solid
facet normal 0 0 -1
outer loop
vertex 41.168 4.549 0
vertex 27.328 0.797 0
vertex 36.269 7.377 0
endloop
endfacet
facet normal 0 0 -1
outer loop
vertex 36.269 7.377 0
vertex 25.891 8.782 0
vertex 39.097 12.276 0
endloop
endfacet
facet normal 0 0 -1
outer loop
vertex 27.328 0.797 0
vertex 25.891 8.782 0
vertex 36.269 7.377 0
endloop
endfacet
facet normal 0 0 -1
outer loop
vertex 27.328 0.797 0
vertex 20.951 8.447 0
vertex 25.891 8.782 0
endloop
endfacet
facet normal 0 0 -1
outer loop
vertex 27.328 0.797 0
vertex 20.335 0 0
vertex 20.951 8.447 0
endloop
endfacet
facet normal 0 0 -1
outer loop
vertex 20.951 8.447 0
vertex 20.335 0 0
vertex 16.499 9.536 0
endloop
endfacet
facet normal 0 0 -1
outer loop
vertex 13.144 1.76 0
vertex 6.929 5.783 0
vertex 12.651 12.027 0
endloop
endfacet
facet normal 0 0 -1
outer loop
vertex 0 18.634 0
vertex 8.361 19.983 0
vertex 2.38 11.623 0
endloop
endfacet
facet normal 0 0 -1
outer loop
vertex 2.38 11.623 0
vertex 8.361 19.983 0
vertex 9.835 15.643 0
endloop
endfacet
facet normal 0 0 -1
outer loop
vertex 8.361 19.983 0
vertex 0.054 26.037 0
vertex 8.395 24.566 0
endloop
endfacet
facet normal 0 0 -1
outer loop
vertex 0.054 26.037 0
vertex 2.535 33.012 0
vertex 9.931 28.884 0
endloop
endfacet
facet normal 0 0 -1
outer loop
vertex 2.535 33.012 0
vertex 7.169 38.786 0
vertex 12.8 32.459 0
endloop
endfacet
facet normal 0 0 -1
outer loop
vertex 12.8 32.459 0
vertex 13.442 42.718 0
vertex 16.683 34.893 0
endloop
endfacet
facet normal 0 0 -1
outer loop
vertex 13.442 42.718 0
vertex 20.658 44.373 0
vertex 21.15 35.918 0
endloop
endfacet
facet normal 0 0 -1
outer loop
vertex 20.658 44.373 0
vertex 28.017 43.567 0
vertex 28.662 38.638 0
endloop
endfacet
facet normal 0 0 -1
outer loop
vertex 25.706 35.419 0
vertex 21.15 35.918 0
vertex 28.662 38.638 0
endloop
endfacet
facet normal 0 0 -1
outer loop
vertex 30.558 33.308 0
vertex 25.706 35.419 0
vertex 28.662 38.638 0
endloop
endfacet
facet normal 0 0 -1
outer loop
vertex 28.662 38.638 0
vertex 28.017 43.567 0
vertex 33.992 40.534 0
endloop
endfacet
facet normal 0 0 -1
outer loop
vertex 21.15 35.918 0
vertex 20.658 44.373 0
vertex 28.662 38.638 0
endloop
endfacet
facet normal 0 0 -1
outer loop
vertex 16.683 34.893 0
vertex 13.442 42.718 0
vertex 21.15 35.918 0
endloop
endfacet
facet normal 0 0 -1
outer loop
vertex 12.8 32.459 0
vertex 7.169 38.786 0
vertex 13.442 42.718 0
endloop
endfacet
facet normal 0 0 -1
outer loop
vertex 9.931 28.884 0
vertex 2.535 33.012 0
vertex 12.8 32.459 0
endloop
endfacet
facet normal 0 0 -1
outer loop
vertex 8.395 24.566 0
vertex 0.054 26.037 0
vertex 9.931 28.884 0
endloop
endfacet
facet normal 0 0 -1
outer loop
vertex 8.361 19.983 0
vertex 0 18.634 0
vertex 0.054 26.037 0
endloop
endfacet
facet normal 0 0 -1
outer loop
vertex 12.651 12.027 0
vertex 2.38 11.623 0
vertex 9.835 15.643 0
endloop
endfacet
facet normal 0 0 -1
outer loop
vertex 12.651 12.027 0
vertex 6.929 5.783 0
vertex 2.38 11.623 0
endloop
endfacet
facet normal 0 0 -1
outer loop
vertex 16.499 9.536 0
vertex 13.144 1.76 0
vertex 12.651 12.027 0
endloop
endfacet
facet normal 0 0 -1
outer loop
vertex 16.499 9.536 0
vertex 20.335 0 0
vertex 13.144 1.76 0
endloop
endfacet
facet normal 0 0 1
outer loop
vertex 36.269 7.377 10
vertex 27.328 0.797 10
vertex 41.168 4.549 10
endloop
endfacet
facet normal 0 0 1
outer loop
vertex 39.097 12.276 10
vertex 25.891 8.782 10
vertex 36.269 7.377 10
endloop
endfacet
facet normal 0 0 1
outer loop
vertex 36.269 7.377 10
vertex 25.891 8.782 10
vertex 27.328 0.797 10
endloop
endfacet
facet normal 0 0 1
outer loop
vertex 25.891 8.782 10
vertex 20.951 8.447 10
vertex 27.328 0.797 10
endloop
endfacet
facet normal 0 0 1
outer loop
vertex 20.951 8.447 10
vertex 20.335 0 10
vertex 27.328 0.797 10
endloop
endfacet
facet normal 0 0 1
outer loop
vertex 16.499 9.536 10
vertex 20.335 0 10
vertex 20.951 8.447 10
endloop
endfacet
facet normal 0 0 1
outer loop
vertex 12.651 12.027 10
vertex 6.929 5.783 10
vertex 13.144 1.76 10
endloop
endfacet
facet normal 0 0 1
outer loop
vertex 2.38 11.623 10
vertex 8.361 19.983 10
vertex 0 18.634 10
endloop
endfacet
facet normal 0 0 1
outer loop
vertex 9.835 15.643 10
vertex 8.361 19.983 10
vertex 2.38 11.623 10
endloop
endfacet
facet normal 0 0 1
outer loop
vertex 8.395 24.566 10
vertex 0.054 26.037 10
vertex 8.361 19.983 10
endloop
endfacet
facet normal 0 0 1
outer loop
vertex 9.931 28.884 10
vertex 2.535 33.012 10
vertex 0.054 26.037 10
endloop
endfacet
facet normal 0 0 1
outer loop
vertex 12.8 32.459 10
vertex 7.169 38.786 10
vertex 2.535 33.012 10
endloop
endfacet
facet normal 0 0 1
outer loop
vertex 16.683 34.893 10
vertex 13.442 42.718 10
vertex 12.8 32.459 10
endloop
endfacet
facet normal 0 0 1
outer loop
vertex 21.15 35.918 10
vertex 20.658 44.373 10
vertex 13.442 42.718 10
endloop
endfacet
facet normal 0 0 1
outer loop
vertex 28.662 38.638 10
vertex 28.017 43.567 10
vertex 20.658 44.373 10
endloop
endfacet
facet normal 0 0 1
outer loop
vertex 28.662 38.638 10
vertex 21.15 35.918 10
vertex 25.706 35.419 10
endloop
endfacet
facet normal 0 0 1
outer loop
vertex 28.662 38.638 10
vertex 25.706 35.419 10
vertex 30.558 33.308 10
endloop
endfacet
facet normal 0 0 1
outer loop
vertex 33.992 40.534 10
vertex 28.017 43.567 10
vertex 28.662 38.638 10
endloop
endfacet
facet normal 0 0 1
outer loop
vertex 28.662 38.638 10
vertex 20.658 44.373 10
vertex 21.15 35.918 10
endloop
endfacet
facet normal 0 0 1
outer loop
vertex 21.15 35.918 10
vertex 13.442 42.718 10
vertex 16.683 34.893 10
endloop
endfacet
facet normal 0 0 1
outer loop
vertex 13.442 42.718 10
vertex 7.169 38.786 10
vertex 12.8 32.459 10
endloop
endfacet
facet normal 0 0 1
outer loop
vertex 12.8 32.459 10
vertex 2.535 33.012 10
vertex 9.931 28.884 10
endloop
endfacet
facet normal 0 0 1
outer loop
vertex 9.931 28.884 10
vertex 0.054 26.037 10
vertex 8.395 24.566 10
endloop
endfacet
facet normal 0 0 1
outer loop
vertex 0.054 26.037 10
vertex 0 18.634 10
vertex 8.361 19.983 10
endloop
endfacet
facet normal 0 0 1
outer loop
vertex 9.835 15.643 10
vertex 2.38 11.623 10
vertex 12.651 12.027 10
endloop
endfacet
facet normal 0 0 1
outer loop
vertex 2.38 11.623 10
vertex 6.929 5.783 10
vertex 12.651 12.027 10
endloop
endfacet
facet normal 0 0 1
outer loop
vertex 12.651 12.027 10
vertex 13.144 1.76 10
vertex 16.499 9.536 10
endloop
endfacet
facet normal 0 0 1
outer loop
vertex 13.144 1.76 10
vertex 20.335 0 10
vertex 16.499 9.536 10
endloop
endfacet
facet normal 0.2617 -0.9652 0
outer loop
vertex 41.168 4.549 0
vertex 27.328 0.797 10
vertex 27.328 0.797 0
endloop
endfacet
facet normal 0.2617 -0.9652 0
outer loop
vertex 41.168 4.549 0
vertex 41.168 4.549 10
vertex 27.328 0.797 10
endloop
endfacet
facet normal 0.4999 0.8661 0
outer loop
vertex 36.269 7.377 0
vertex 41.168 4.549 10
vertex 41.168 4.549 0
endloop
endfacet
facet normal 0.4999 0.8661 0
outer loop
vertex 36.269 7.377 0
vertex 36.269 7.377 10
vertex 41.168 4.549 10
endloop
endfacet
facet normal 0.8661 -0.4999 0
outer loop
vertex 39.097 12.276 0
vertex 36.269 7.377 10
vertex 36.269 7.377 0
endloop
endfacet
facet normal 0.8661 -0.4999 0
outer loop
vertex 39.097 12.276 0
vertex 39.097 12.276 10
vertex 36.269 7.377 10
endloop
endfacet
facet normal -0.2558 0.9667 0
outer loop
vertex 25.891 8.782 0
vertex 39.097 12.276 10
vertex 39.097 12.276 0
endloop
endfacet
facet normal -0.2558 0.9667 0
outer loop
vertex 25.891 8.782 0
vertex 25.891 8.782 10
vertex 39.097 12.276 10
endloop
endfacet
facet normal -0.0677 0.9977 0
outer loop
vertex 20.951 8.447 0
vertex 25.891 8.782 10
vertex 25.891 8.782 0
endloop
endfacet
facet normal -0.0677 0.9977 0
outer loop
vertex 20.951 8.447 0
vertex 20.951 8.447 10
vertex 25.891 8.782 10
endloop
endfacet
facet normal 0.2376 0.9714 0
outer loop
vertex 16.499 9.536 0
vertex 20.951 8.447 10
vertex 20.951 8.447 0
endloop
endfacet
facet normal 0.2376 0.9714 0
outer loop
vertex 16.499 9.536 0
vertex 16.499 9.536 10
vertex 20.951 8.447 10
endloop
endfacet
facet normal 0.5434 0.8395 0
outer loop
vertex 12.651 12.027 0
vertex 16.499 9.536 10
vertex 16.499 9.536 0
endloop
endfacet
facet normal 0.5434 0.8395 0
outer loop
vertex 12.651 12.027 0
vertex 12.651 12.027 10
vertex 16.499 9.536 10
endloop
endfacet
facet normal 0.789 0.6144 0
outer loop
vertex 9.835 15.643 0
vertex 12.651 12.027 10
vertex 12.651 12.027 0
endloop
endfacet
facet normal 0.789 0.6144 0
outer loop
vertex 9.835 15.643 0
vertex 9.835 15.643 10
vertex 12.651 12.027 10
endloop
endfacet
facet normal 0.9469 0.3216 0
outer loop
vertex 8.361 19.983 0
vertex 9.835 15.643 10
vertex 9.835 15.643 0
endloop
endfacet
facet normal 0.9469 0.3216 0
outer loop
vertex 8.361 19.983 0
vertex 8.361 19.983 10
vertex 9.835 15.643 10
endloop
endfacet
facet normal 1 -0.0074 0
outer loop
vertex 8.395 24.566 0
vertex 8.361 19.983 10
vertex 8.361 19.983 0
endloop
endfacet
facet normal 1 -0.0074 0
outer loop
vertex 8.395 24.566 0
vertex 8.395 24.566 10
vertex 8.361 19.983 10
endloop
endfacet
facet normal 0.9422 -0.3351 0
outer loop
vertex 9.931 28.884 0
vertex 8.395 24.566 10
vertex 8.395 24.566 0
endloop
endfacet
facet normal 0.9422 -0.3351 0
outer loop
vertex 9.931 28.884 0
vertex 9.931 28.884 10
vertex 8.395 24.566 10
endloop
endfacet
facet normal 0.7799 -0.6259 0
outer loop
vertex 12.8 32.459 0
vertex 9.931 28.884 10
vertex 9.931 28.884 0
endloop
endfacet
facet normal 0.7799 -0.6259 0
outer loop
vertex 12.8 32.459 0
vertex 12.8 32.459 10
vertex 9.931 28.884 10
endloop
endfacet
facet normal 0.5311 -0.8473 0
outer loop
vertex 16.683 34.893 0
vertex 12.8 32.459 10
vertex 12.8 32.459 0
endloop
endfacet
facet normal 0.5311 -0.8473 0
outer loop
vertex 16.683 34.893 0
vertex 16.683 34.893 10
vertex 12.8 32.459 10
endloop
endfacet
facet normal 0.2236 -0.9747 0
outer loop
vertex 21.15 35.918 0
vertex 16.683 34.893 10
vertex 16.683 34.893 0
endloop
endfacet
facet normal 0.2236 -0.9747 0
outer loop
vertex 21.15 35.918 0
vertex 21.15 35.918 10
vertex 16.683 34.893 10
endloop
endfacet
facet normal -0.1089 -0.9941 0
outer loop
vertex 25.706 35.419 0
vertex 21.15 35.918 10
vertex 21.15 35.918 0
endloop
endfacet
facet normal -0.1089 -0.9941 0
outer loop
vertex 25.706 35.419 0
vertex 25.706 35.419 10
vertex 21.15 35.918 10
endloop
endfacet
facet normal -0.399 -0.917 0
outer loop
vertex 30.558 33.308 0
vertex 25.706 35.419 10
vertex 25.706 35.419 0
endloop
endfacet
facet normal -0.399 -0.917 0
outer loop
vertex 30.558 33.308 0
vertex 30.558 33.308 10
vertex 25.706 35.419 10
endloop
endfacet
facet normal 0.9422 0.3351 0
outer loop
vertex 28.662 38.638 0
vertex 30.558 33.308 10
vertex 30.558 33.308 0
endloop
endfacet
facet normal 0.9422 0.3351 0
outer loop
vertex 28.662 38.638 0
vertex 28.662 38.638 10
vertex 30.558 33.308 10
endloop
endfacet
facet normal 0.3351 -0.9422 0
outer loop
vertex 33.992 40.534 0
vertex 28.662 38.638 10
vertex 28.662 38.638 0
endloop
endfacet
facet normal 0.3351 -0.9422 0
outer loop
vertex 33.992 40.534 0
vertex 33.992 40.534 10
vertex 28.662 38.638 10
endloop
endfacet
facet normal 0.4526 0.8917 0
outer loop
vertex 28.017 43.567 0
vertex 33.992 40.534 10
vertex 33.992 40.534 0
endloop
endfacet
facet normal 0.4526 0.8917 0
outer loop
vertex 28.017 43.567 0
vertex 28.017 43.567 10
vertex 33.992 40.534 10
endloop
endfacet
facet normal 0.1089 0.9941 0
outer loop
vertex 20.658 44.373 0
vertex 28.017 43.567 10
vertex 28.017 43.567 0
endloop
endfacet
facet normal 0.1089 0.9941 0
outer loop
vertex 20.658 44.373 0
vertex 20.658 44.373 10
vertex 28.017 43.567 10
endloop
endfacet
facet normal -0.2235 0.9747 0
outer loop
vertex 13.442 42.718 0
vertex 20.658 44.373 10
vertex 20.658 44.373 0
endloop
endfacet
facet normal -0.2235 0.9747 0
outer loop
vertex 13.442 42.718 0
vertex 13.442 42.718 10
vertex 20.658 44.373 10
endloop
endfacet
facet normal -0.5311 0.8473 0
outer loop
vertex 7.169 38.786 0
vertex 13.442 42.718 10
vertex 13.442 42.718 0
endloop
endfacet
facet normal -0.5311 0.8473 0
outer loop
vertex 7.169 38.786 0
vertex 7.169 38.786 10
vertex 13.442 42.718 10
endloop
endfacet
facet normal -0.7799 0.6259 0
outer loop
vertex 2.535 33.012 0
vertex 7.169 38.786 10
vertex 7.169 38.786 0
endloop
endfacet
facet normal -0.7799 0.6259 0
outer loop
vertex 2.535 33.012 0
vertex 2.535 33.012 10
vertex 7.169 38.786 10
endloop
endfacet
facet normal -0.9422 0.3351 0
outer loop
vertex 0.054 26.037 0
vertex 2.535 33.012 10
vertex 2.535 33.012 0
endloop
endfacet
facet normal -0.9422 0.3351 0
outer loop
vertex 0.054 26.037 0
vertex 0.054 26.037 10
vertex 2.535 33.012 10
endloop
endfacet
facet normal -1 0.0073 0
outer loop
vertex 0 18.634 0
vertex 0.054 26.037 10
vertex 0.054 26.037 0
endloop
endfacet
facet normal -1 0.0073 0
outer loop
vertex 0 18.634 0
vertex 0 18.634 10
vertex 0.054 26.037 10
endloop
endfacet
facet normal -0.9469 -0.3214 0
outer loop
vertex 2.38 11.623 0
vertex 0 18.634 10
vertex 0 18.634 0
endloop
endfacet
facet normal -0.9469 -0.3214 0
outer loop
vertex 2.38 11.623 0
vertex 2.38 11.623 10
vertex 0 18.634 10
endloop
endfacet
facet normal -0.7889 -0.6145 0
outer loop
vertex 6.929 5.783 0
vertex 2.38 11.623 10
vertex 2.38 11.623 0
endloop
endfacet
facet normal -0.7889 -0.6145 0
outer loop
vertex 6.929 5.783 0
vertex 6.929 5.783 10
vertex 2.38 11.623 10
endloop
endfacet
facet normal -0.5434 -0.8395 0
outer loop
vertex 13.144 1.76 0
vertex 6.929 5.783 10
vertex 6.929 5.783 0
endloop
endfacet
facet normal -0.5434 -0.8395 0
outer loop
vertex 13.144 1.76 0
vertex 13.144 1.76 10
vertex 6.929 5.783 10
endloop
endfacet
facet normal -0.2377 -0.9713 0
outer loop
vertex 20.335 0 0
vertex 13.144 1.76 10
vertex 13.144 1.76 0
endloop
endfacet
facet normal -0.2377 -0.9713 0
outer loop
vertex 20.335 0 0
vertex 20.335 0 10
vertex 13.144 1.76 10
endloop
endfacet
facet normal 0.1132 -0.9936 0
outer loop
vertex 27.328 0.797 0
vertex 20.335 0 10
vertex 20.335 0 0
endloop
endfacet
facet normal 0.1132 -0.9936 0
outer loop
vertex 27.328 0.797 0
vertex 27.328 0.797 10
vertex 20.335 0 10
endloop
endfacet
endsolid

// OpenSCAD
$fn = 32;

// ----------------------------------------------------------------------
// Eye lug: ring_tail, 10 mm thick
// ----------------------------------------------------------------------

// --- parameters (mm) ---
profile_height = 10;      // extrusion height
profile_points = 30;      // points of the closed outline

profile = [[28.662, 38.638], [33.992, 40.534], [28.017, 43.567], [20.658, 44.373], [13.442, 42.718], [7.169, 38.786], [2.535, 33.012], [0.054, 26.037], [0, 18.634], [2.38, 11.623], [6.929, 5.783], [13.144, 1.76], [20.335, 0], [27.328, 0.797], [41.168, 4.549], [36.269, 7.377], [39.097, 12.276], [25.891, 8.782], [20.951, 8.447], [16.499, 9.536], [12.651, 12.027], [9.835, 15.643], [8.361, 19.983], [8.395, 24.566], [9.931, 28.884], [12.8, 32.459], [16.683, 34.893], [21.15, 35.918], [25.706, 35.419], [30.558, 33.308]];  // single closed polygon, 30 points, counter clockwise

// --- the one profile operation ---
linear_extrude(height = profile_height) polygon(points = profile);
